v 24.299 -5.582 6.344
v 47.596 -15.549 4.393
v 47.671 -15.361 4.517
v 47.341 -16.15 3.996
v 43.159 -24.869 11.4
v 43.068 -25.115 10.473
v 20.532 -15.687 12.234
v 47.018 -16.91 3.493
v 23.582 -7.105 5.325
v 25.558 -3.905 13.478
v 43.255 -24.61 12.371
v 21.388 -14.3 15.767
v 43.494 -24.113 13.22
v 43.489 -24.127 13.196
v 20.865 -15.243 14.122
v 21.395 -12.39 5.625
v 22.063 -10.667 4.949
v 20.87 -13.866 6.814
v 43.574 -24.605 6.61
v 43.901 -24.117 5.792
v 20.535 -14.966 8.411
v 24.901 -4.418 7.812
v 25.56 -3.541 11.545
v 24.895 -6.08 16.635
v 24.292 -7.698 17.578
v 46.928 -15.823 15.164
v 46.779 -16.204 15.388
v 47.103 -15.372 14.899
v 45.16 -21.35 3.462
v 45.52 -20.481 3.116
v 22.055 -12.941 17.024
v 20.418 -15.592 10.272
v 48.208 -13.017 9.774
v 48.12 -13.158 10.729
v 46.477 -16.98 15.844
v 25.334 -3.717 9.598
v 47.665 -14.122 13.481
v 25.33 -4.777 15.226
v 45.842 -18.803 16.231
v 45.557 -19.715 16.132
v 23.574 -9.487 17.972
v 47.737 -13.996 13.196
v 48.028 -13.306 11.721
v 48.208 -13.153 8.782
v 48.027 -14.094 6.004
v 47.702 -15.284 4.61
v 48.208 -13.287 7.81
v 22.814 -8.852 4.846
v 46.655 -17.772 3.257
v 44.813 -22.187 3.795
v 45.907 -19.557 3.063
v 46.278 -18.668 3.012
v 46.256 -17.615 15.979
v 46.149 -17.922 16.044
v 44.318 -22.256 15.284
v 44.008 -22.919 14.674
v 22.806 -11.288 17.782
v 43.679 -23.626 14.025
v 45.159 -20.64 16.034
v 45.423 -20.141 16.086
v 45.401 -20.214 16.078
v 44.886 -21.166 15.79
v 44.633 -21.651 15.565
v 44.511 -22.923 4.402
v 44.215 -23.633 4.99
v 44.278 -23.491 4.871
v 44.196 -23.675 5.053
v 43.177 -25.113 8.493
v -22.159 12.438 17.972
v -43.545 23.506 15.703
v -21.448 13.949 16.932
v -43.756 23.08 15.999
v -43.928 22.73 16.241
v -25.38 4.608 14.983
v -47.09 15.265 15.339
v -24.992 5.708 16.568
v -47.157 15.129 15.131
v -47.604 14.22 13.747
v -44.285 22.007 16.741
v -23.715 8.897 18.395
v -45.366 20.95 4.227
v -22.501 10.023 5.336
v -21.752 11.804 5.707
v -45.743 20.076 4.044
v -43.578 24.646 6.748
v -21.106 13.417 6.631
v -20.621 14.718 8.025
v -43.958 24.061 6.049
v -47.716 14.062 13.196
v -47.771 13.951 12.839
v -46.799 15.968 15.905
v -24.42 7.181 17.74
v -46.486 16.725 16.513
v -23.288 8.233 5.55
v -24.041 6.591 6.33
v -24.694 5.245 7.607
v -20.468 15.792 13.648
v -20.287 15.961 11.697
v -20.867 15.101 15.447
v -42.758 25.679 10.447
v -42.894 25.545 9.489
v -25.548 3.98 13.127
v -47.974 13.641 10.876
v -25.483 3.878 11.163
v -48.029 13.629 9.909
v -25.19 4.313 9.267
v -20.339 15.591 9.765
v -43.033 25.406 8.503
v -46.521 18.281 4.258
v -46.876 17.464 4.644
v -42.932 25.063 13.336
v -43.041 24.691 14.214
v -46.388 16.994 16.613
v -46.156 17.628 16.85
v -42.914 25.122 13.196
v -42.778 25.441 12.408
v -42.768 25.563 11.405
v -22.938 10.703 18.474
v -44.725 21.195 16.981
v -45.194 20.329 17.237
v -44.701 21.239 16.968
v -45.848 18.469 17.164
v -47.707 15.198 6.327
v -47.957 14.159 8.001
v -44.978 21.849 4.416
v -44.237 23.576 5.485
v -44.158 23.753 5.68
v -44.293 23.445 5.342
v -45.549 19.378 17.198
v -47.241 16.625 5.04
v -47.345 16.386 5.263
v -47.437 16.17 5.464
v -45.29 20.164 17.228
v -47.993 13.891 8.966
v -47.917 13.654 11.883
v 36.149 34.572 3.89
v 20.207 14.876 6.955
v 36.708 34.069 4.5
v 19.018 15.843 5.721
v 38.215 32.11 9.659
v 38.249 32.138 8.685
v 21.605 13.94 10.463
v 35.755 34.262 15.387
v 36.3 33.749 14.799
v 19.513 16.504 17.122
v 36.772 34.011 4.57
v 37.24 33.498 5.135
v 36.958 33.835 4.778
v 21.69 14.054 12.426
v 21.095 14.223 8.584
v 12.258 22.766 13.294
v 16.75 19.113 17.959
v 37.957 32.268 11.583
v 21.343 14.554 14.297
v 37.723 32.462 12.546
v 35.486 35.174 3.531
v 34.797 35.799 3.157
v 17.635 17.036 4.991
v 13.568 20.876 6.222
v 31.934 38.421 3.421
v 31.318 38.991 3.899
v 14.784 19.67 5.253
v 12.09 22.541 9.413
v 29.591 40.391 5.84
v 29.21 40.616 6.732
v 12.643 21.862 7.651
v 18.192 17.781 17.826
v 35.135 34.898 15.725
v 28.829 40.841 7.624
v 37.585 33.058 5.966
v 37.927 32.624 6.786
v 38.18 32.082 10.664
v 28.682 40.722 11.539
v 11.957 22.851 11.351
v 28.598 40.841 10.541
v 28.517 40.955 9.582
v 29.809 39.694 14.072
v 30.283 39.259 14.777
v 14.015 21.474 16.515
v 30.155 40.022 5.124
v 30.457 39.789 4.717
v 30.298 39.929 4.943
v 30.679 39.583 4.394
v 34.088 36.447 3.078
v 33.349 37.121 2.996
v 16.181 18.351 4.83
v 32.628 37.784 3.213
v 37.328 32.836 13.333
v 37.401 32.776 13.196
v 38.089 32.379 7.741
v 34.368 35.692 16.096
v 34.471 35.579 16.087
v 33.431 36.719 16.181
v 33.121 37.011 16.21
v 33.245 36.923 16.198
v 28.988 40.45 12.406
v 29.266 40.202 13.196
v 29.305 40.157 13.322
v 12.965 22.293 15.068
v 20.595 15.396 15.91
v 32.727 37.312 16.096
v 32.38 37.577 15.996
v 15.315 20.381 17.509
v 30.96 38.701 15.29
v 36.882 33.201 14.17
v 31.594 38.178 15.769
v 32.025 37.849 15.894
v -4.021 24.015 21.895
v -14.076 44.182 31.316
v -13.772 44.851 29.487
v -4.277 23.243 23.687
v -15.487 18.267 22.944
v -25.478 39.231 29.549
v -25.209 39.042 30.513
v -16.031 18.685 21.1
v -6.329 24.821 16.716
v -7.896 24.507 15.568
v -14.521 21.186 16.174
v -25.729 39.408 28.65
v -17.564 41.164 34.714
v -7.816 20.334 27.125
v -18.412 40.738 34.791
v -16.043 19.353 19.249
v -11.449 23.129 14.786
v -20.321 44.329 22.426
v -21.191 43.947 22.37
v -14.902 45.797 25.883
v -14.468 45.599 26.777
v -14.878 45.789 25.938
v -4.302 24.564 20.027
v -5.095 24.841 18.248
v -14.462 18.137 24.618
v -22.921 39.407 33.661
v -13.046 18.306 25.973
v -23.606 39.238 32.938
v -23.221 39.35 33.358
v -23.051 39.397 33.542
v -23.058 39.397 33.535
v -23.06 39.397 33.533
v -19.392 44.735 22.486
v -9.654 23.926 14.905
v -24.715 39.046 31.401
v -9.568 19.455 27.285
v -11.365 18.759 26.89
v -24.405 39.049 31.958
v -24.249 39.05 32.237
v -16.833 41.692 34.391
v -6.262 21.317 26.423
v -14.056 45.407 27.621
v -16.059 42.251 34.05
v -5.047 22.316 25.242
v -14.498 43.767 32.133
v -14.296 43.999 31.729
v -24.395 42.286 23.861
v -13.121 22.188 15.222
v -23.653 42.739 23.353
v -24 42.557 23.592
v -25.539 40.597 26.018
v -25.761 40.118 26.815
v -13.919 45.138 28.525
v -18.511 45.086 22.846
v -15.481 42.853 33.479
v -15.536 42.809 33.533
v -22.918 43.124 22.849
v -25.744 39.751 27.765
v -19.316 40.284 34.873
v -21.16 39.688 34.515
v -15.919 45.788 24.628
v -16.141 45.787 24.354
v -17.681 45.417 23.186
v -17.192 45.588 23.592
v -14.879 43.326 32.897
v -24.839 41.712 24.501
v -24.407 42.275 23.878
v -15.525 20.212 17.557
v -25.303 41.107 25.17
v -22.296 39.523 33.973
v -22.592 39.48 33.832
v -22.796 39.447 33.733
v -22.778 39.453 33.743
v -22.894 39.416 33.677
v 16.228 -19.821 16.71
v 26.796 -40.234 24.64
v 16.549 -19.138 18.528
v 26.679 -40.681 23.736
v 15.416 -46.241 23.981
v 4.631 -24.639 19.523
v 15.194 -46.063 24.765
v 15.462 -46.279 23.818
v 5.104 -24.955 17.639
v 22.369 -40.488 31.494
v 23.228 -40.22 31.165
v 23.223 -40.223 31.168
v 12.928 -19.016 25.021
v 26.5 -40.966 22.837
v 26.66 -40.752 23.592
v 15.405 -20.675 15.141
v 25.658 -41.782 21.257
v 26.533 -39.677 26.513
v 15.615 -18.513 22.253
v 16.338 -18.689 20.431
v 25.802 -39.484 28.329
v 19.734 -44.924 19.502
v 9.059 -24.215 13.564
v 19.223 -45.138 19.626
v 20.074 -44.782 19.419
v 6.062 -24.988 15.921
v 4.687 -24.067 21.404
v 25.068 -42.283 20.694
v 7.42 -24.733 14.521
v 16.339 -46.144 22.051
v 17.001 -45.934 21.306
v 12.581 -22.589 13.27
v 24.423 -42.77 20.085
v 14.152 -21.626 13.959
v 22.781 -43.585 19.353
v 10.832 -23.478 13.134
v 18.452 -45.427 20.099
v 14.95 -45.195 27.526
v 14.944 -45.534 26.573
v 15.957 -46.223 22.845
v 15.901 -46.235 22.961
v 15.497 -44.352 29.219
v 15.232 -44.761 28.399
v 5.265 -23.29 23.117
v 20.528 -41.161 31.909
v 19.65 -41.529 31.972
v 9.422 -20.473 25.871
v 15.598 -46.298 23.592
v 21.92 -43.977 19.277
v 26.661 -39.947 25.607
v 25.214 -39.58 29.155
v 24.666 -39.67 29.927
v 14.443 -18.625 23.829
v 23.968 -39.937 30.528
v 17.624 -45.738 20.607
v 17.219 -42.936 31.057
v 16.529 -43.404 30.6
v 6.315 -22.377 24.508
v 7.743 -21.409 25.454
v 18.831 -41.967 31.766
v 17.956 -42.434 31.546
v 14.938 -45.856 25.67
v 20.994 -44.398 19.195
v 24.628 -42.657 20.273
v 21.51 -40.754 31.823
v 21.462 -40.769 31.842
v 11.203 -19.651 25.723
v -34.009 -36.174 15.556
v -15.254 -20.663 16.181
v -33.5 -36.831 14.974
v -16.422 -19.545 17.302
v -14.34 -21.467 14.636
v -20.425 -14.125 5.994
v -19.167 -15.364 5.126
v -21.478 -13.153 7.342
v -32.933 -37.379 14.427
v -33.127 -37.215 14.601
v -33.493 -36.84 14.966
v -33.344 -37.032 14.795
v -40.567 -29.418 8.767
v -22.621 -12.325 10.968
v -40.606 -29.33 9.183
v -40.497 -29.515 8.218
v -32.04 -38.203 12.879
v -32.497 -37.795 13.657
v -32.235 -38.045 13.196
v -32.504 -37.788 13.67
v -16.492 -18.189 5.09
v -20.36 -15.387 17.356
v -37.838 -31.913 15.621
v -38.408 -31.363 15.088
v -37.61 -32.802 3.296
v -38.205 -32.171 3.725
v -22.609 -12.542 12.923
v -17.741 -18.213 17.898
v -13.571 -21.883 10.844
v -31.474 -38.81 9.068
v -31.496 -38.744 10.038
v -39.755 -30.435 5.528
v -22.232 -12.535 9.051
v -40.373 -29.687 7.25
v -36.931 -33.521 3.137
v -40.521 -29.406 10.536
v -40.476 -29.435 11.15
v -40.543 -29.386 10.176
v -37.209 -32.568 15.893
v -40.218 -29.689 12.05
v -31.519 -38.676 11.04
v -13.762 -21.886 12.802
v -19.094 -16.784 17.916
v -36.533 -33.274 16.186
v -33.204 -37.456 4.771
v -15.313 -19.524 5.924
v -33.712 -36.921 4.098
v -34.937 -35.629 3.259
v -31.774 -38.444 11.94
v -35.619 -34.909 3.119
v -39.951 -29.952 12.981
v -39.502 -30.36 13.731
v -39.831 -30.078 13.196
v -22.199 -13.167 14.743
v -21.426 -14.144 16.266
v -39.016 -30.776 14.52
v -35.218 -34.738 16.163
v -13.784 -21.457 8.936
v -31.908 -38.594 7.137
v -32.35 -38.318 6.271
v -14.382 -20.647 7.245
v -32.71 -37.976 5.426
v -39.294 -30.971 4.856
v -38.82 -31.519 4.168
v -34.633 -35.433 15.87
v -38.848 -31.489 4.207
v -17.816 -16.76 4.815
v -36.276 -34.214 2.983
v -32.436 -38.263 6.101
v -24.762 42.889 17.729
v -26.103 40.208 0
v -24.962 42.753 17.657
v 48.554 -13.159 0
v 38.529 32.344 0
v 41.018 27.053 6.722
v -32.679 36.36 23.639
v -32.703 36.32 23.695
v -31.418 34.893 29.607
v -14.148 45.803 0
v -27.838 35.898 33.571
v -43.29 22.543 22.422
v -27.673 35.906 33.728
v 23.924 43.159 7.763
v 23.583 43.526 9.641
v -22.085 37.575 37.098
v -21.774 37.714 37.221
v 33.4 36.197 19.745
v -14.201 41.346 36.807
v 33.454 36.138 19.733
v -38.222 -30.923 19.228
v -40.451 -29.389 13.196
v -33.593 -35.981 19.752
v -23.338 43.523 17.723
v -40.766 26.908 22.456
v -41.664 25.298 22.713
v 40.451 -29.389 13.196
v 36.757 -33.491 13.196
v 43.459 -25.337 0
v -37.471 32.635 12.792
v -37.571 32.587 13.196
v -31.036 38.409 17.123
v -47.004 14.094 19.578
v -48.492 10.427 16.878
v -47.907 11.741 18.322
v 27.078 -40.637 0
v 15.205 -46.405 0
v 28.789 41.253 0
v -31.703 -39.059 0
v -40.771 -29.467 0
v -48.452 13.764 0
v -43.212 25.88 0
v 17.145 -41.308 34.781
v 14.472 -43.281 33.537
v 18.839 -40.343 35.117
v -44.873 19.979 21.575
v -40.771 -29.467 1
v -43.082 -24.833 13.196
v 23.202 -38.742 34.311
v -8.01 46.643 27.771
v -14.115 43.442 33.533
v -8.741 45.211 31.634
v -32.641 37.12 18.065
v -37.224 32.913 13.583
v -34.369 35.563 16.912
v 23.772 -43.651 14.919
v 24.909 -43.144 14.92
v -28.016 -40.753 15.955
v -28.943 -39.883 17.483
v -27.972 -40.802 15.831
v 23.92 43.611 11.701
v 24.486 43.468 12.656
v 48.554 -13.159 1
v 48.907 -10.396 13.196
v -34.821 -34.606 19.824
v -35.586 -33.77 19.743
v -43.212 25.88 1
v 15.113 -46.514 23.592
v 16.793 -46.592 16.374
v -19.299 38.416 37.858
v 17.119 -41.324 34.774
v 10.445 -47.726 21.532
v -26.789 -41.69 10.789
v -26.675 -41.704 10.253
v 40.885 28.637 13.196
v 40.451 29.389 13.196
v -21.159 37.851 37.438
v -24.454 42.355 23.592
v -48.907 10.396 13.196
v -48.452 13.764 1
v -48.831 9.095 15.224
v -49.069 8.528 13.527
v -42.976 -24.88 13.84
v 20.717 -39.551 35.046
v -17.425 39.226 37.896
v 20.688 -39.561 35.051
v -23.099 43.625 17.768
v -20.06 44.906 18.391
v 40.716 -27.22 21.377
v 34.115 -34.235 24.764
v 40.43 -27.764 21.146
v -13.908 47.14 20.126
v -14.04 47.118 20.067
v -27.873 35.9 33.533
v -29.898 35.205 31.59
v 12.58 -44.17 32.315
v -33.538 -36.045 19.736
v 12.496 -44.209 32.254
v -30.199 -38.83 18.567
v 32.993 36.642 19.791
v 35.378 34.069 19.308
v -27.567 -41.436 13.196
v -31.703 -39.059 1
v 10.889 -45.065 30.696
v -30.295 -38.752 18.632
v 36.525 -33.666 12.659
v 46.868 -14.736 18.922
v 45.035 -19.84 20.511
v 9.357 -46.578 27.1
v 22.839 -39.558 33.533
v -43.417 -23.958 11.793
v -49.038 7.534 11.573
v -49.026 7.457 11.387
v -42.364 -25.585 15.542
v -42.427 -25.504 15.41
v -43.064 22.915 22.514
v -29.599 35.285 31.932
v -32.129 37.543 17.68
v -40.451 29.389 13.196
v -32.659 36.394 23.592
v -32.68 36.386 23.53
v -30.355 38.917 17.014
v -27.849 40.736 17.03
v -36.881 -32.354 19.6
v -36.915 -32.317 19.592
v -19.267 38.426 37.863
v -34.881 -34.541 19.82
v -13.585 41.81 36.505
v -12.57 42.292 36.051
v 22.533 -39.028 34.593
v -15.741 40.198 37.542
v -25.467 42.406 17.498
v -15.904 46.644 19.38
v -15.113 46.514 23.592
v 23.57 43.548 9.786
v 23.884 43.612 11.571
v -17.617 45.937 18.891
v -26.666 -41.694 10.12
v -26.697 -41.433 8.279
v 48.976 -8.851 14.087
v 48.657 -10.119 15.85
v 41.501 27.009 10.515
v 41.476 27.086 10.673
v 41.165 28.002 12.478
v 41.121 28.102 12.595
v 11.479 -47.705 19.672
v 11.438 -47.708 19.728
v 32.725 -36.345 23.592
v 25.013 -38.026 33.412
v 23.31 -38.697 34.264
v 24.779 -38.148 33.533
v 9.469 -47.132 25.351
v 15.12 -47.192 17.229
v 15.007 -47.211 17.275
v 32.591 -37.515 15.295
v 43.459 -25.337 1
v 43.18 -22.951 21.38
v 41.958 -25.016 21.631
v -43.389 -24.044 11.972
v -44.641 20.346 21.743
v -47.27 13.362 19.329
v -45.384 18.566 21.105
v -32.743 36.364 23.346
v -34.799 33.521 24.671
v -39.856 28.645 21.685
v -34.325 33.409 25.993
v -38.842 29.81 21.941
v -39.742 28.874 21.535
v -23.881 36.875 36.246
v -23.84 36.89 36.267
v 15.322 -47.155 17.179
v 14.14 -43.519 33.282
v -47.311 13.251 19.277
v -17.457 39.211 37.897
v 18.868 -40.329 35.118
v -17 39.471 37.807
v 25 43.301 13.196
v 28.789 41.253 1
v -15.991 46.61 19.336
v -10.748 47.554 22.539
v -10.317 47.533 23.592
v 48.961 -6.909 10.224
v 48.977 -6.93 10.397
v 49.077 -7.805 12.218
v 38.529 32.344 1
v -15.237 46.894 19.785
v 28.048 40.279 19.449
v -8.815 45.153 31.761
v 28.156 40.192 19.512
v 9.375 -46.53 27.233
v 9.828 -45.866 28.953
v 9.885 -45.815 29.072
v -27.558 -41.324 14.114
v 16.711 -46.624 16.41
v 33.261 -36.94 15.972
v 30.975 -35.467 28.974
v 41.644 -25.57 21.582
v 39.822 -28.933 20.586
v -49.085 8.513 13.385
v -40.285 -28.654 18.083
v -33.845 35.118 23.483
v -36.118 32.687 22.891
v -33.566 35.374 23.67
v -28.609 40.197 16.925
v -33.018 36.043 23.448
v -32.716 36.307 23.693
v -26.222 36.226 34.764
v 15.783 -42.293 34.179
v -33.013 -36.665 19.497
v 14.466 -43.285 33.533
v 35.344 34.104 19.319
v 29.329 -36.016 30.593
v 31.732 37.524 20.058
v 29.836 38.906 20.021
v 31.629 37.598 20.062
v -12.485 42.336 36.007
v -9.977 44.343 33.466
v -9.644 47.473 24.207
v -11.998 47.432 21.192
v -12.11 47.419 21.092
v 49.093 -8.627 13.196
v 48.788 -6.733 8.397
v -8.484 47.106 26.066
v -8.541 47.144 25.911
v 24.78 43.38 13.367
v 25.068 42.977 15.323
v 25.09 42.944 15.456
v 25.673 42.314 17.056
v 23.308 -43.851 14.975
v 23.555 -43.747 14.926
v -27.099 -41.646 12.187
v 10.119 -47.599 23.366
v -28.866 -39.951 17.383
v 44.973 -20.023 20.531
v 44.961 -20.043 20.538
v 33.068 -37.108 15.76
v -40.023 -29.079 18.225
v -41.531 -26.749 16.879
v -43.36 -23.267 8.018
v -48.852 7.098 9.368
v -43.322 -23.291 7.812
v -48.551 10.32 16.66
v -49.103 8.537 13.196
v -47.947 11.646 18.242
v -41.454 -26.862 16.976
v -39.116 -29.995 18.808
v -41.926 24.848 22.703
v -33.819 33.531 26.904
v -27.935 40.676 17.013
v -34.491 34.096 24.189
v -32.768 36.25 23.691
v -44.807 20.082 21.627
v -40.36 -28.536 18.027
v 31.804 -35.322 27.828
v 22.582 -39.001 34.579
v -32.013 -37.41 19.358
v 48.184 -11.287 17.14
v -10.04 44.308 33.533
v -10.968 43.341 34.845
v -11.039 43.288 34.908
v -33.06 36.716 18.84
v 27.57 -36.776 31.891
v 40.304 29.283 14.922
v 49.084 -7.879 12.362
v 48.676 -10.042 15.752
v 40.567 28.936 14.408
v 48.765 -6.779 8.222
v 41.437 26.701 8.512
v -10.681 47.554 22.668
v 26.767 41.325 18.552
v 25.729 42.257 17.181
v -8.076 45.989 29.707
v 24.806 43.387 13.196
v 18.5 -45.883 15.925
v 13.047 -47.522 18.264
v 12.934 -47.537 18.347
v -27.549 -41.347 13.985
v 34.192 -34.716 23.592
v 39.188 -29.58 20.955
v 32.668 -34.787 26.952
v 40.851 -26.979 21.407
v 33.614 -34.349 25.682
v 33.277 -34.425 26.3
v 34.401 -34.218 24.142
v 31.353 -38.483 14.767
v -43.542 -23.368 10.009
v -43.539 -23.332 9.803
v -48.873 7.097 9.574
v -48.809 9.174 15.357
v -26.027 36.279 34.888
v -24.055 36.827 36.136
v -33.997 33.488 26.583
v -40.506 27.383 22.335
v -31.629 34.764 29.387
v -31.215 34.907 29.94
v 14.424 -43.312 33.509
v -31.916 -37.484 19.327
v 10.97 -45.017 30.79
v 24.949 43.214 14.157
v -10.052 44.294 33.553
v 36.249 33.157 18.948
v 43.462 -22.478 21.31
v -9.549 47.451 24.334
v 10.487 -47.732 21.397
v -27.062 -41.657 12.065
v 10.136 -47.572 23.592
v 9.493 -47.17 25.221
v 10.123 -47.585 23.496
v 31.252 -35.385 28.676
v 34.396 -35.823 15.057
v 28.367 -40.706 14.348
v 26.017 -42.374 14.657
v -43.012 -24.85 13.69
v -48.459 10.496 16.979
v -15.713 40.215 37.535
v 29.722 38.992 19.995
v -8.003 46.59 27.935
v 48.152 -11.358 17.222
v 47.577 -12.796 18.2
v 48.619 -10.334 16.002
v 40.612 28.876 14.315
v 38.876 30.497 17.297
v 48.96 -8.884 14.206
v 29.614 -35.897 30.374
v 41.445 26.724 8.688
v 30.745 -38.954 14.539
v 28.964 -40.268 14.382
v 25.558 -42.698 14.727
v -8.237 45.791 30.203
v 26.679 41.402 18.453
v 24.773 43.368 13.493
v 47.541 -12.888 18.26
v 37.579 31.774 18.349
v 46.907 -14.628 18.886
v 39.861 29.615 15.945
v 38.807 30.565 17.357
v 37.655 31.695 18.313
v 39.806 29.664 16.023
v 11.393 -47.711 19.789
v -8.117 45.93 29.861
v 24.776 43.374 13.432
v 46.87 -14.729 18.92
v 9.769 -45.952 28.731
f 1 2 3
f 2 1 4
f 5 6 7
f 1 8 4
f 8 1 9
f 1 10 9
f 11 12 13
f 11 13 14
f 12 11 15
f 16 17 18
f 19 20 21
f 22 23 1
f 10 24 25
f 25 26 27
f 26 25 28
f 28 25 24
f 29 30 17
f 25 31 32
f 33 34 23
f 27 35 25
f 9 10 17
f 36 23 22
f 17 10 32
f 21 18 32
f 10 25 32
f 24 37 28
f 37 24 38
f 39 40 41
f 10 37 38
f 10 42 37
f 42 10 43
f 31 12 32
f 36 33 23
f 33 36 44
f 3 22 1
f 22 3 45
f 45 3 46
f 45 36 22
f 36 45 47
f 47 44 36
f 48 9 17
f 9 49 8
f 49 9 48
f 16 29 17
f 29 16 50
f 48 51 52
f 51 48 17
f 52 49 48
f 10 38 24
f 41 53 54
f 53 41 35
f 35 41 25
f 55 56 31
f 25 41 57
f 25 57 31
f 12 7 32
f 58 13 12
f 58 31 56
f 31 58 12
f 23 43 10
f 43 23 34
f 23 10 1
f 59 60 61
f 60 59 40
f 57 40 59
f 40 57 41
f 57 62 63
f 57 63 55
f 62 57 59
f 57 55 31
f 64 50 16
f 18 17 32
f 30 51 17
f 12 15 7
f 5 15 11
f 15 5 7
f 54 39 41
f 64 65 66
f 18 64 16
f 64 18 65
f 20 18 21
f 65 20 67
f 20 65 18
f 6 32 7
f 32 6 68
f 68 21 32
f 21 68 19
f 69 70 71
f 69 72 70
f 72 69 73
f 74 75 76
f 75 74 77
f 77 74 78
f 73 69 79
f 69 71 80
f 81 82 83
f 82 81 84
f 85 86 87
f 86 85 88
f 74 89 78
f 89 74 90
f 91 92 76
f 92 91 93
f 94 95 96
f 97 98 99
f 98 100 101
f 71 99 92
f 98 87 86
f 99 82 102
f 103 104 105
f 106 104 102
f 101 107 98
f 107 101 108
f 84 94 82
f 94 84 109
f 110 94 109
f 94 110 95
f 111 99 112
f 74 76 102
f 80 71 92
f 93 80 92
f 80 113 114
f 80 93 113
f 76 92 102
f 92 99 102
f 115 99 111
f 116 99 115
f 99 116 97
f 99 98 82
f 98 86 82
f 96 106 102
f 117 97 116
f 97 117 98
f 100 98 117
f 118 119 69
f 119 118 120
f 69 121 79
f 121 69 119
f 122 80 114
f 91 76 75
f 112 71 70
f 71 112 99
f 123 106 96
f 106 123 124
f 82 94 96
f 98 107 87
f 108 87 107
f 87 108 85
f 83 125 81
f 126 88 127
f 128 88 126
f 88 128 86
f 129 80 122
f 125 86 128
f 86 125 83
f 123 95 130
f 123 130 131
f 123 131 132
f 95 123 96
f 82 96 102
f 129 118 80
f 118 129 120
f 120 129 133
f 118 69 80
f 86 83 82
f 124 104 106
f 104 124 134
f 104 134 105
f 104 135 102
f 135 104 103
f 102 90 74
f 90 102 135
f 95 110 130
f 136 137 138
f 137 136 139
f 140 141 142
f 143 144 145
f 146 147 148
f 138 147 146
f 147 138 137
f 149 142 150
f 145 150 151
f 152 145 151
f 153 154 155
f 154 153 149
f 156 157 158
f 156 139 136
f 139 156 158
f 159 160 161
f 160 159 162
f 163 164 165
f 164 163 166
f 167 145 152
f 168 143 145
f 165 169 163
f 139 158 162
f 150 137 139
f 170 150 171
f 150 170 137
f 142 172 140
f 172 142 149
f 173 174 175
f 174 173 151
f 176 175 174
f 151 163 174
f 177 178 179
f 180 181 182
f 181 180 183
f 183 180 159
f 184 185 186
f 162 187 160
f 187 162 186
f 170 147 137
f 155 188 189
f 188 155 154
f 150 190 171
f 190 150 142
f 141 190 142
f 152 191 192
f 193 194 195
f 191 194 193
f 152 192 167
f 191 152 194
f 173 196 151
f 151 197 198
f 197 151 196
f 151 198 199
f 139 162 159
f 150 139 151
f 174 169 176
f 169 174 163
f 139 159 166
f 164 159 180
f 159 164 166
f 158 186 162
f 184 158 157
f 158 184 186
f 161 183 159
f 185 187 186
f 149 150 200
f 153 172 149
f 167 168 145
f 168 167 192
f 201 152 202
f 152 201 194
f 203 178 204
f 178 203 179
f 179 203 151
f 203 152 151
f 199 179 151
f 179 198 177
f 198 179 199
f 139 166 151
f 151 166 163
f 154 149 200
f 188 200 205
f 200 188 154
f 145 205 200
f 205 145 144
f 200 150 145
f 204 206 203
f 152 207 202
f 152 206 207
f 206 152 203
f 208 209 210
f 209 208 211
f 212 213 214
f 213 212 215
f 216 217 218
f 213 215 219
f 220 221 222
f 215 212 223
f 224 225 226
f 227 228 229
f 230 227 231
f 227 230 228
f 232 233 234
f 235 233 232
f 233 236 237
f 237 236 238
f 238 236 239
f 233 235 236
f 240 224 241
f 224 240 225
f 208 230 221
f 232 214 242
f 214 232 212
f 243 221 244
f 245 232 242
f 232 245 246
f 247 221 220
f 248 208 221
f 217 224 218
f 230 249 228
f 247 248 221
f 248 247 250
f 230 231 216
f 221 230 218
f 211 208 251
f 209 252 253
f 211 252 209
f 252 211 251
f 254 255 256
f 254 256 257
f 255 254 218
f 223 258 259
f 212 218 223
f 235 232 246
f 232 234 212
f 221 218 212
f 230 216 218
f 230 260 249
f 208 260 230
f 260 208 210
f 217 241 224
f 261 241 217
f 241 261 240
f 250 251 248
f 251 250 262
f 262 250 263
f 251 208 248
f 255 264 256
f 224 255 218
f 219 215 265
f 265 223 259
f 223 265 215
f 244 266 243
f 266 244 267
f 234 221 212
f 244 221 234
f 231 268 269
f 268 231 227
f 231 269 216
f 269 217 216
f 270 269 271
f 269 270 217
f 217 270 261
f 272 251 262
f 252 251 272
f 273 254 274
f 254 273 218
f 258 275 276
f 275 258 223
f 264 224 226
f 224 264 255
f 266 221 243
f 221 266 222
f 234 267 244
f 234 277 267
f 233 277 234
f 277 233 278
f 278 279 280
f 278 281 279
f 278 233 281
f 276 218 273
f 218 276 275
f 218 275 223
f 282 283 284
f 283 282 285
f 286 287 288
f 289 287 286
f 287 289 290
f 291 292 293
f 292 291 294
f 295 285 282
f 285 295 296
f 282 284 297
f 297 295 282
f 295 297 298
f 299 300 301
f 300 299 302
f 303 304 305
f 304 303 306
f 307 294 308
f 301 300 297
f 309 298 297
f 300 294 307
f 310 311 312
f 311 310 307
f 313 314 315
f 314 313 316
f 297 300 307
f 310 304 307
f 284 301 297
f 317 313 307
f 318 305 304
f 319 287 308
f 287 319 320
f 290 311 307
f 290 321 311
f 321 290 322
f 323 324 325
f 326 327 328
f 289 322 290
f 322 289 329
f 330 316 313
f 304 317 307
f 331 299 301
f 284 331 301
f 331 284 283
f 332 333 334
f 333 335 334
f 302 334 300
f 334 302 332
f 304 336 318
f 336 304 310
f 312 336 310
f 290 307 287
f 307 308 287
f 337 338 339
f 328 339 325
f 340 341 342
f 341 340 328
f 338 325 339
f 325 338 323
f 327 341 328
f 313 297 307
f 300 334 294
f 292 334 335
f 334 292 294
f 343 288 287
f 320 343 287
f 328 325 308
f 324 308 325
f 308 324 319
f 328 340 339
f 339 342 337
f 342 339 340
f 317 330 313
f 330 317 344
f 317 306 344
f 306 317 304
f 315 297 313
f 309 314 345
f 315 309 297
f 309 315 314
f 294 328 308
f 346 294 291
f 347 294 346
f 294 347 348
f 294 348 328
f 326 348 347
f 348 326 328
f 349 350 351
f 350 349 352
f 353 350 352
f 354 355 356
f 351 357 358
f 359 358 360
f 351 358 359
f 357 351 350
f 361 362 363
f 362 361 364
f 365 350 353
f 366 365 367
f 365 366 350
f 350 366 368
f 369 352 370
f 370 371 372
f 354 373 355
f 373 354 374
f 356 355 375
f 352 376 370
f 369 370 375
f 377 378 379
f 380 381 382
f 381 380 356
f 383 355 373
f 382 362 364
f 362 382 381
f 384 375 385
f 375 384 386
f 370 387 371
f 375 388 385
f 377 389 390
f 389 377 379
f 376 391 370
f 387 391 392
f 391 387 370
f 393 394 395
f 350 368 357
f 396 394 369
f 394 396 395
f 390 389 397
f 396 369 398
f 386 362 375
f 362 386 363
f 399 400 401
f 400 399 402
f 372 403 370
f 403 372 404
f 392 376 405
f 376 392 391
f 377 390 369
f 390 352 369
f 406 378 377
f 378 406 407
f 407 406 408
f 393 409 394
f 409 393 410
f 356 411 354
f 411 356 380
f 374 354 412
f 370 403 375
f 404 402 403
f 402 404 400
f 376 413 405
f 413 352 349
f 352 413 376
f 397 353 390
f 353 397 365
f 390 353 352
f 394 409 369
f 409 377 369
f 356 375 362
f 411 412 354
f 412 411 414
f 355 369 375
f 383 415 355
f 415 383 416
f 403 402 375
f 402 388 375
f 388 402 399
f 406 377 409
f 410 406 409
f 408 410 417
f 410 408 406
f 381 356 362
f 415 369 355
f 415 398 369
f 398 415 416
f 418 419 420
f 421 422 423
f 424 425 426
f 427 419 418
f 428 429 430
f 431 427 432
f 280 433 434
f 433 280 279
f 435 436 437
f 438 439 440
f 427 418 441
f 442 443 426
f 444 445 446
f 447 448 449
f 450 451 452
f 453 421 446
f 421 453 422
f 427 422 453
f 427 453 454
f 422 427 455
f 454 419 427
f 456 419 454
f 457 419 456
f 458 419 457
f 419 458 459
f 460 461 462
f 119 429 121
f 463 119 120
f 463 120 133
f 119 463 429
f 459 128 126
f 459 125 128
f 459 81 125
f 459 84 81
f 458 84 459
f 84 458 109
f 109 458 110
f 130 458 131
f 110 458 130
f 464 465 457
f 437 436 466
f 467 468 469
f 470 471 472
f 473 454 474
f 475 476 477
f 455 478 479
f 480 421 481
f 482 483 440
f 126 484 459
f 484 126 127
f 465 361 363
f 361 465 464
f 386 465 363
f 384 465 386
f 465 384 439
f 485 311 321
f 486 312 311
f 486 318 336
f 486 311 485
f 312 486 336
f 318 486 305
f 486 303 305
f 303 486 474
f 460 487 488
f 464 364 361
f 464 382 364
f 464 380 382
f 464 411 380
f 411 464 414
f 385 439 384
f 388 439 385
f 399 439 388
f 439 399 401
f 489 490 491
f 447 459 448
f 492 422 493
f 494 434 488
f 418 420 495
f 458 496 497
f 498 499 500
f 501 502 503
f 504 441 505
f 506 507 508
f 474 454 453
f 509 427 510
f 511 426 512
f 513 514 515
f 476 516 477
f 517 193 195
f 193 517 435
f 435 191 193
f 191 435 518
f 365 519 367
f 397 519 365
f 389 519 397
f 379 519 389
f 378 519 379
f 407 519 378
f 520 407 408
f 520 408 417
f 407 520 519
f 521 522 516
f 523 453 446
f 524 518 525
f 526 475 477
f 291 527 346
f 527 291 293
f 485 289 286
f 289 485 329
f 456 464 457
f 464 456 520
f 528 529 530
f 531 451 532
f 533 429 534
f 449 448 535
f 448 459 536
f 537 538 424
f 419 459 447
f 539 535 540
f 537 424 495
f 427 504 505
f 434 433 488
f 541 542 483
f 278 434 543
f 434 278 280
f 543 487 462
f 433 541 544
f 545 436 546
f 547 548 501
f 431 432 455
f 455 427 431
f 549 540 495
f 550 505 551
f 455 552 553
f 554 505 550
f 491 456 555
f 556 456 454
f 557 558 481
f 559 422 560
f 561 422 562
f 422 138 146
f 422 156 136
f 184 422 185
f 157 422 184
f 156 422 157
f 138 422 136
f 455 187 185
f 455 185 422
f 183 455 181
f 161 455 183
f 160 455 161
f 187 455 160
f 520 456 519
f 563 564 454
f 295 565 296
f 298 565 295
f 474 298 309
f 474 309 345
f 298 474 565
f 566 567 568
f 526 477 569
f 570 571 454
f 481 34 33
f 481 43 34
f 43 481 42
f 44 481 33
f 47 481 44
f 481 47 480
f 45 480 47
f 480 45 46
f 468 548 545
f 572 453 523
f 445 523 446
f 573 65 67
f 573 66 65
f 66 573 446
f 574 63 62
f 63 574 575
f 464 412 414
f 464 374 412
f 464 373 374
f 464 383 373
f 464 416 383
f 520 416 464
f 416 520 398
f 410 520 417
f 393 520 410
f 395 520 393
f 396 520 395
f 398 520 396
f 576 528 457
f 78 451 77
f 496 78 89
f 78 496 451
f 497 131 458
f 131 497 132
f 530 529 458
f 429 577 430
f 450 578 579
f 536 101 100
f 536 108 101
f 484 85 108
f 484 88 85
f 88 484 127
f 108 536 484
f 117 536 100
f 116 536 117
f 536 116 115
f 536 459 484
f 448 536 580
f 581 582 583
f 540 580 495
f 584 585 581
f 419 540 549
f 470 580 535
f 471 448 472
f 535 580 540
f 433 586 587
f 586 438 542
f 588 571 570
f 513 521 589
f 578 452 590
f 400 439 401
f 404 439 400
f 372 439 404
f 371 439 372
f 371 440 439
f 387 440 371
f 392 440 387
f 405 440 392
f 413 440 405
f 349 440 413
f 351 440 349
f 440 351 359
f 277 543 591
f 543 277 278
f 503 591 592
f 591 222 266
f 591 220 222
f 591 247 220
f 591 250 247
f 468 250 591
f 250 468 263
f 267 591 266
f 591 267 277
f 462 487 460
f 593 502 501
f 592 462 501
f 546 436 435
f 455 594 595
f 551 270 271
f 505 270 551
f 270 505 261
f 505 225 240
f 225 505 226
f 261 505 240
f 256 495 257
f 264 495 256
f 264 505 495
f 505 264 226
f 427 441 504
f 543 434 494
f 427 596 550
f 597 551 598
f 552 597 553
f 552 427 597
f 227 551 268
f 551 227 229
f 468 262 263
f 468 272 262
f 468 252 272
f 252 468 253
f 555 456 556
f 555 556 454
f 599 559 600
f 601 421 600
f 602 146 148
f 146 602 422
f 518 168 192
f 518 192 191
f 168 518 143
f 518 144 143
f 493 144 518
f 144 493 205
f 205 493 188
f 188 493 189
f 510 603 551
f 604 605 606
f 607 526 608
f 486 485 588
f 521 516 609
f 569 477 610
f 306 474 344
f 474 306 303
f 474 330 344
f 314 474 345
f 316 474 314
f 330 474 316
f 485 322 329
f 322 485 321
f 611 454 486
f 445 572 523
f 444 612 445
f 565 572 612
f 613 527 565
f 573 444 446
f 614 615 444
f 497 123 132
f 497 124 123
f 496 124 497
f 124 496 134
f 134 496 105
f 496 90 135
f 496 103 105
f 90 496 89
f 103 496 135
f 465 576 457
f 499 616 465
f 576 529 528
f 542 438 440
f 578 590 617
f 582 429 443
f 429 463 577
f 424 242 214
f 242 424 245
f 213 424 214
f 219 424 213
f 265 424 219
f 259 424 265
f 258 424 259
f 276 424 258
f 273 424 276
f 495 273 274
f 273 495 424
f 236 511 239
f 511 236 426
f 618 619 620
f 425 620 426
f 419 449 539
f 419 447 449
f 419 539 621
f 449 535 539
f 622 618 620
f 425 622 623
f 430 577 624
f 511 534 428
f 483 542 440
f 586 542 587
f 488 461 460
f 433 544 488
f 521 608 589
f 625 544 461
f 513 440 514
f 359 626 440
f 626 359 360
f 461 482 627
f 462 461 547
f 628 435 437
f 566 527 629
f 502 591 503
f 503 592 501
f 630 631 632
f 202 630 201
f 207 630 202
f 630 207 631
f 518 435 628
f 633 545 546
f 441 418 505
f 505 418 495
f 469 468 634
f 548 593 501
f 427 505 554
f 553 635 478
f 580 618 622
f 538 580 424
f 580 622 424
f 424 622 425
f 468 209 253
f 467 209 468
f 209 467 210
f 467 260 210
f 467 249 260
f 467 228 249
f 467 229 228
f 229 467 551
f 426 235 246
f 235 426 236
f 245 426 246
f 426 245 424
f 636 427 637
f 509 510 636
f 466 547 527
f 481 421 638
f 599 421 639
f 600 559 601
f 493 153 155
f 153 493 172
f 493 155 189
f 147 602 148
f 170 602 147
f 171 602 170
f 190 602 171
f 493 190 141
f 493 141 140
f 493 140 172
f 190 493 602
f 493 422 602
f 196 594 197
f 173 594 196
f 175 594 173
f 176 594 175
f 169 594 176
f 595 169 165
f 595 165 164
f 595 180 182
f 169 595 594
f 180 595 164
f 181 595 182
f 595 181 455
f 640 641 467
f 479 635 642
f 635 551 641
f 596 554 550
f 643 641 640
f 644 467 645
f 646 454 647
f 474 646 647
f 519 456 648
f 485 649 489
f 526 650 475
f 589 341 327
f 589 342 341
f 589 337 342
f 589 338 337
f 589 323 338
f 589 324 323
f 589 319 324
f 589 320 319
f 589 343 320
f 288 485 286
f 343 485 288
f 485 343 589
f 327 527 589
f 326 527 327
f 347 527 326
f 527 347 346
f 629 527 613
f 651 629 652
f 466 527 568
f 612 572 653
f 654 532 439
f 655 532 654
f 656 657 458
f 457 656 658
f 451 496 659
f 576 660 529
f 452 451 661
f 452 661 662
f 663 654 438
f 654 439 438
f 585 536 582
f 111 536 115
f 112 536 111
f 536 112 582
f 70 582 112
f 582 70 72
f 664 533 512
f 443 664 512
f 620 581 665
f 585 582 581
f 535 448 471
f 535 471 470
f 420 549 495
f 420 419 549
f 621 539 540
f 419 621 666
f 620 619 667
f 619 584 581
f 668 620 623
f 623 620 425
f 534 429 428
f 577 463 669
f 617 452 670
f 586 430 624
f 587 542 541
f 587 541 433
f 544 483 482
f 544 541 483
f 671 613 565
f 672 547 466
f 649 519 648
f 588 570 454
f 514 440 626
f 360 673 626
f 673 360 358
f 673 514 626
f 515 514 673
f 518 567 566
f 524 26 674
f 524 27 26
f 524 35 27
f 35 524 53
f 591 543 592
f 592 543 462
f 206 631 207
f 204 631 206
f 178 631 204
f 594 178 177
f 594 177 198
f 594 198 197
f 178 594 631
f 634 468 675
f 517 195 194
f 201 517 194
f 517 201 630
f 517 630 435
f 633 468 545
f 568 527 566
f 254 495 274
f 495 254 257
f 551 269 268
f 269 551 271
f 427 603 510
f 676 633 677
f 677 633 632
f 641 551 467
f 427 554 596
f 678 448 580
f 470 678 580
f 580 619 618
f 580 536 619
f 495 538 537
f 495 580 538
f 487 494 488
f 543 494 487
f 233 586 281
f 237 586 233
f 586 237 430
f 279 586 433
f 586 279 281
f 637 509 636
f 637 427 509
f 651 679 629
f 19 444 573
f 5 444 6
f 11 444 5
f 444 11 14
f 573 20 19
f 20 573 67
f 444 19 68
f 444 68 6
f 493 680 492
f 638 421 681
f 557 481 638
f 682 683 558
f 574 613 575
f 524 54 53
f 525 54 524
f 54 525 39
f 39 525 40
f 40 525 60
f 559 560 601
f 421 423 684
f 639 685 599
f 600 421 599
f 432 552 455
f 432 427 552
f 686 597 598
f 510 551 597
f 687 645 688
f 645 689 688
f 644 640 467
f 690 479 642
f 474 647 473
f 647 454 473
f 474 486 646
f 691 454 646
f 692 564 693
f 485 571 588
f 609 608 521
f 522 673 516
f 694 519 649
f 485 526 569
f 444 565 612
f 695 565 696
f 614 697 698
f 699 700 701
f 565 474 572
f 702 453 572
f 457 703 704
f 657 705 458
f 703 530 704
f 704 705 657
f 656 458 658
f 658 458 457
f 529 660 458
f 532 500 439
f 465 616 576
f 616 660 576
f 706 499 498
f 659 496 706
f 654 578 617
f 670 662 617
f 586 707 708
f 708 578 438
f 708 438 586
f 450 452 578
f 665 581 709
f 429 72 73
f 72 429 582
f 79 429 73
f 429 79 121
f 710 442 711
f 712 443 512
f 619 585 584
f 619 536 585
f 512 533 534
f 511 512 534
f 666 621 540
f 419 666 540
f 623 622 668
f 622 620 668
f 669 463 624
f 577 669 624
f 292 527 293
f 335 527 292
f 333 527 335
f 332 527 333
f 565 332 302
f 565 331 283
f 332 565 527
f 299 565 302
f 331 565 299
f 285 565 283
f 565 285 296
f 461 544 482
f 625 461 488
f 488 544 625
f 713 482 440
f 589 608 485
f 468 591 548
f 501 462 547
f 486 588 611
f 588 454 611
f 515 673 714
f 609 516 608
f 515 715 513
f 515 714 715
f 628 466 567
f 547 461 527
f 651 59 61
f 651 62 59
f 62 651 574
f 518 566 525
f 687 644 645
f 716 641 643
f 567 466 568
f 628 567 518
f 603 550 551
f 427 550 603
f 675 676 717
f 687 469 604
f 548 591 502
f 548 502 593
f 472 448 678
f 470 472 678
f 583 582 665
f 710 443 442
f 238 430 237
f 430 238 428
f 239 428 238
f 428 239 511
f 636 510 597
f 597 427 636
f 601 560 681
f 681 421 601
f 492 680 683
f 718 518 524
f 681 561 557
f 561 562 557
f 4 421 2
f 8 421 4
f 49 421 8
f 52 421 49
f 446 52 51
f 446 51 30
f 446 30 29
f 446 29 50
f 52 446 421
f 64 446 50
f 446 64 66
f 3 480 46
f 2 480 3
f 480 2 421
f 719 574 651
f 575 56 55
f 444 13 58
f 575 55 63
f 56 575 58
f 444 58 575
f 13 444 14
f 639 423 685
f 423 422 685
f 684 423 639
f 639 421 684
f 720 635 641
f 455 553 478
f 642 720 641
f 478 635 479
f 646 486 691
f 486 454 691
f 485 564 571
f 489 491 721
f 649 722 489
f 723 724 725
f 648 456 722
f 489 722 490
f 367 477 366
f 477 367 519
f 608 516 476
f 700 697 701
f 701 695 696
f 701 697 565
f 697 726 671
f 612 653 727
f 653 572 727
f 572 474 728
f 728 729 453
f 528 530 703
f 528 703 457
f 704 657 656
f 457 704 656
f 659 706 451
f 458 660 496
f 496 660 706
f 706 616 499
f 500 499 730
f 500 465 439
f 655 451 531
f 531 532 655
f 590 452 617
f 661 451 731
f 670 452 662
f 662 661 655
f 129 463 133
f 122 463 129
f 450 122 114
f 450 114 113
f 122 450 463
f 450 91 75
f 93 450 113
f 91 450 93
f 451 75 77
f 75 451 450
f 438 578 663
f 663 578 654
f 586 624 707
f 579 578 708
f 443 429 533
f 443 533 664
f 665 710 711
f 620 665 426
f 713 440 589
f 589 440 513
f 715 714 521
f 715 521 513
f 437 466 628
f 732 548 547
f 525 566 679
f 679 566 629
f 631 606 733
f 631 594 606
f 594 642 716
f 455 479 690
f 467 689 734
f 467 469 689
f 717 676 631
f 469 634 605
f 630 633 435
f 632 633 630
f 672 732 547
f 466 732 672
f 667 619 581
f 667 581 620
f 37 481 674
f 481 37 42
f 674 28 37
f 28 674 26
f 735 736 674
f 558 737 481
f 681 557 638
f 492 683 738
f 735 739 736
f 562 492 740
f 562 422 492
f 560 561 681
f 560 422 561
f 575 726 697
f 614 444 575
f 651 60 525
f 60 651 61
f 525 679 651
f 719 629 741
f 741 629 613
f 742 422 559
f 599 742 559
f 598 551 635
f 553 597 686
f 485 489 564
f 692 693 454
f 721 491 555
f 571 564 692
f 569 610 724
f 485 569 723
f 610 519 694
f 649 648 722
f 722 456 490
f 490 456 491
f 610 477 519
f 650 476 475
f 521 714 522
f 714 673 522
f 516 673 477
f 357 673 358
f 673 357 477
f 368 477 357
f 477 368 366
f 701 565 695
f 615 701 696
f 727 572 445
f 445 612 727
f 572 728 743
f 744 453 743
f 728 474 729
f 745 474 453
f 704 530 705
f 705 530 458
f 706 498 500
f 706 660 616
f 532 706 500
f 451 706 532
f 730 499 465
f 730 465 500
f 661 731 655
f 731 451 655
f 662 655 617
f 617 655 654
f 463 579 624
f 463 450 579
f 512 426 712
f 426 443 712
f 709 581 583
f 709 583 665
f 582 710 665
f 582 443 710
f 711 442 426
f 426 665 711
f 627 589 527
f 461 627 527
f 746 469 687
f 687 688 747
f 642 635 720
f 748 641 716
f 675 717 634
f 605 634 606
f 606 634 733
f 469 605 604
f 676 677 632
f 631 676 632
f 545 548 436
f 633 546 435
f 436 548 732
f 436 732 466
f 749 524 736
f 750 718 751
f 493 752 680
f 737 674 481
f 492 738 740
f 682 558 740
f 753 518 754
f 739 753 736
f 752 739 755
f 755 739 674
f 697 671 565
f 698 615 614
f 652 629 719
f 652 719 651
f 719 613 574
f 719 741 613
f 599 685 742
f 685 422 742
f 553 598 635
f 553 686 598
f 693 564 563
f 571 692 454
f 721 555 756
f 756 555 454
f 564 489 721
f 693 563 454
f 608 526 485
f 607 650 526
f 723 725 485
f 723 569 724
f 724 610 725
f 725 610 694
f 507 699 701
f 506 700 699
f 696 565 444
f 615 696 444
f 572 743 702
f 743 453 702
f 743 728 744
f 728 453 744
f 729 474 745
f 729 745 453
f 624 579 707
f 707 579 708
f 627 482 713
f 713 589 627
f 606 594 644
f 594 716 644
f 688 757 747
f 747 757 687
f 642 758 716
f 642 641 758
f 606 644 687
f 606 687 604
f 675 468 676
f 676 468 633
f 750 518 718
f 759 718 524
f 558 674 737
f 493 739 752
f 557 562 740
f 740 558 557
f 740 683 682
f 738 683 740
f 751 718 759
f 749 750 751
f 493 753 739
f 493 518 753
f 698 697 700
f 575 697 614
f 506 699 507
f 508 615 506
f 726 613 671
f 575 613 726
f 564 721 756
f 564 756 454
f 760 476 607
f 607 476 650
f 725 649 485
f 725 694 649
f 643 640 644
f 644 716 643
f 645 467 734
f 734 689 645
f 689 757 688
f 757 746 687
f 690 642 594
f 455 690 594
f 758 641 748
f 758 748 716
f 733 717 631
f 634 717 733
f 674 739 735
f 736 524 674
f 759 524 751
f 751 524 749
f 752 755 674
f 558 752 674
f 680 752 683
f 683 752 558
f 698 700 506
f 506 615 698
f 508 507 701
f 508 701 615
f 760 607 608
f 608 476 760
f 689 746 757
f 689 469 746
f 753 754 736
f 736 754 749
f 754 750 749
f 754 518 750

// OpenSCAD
difference() {
	hull() {
		union() {
			union() {
				rotate(a = -22.7032137393, v = [0, 0, 1]) {
					translate(v = [0, -6.6000000000, 0]) {
						cube(size = [49.8704970280, 13.2000000000, 1]);
					}
				}
				rotate(a = 156.6117949407, v = [0, 0, 1]) {
					translate(v = [0, -6.6000000000, 0]) {
						cube(size = [49.9350070860, 13.2000000000, 1]);
					}
				}
				rotate(a = 47.5515196212, v = [0, 0, 1]) {
					translate(v = [0, -6.6000000000, 0]) {
						cube(size = [49.8704973432, 13.2000000000, 1]);
					}
				}
				rotate(a = 115.0783958010, v = [0, 0, 1]) {
					translate(v = [0, -6.6000000000, 0]) {
						cube(size = [47.4817833746, 13.2000000000, 1]);
					}
				}
				rotate(a = -64.0908088880, v = [0, 0, 1]) {
					translate(v = [0, -6.6000000000, 0]) {
						cube(size = [48.3838401850, 13.2000000000, 1]);
					}
				}
				rotate(a = -136.6039430228, v = [0, 0, 1]) {
					translate(v = [0, -6.6000000000, 0]) {
						cube(size = [49.8704963267, 13.2000000000, 1]);
					}
				}
			}
			translate(v = [0, 0, 13.1962534185]) {
				intersection() {
					hull() {
						rotate(a = 94.1246114265, v = [0.3849580616, 0.9201271419, -0.0000013051]) {
							cylinder(h = 50, r = 9.6000000000);
						}
						rotate(a = 92.9217101120, v = [-0.3964430133, -0.9166432552, 0.0000013131]) {
							cylinder(h = 50, r = 9.6000000000);
						}
						rotate(a = 94.1245562003, v = [-0.7359734324, 0.6731789595, 0.0000000628]) {
							cylinder(h = 50, r = 9.6000000000);
						}
						rotate(a = 71.7383656861, v = [-0.8601119511, -0.4025109262, 0.0000012626]) {
							cylinder(h = 50, r = 9.6000000000);
						}
						rotate(a = 75.3926712915, v = [0.8704136325, 0.4228223392, -0.0000012932]) {
							cylinder(h = 50, r = 9.6000000000);
						}
						rotate(a = 94.1247343397, v = [0.6852579577, -0.7247398776, 0.0000000395]) {
							cylinder(h = 50, r = 9.6000000000);
						}
					}
					sphere(r = 50);
				}
			}
		}
	}
	translate(v = [0, 0, 13.1962534185]) {
		rotate(a = 94.1246114265, v = [0.3849580616, 0.9201271419, -0.0000013051]) {
			translate(v = [0, 0, 25]) {
				cylinder(h = 50, r = 6.6000000000);
			}
		}
		rotate(a = 92.9217101120, v = [-0.3964430133, -0.9166432552, 0.0000013131]) {
			translate(v = [0, 0, 25]) {
				cylinder(h = 50, r = 6.6000000000);
			}
		}
		rotate(a = 94.1245562003, v = [-0.7359734324, 0.6731789595, 0.0000000628]) {
			translate(v = [0, 0, 25]) {
				cylinder(h = 50, r = 6.6000000000);
			}
		}
		rotate(a = 71.7383656861, v = [-0.8601119511, -0.4025109262, 0.0000012626]) {
			translate(v = [0, 0, 25]) {
				cylinder(h = 50, r = 6.6000000000);
			}
		}
		rotate(a = 75.3926712915, v = [0.8704136325, 0.4228223392, -0.0000012932]) {
			translate(v = [0, 0, 25]) {
				cylinder(h = 50, r = 6.6000000000);
			}
		}
		rotate(a = 94.1247343397, v = [0.6852579577, -0.7247398776, 0.0000000395]) {
			translate(v = [0, 0, 25]) {
				cylinder(h = 50, r = 6.6000000000);
			}
		}
	}
}
